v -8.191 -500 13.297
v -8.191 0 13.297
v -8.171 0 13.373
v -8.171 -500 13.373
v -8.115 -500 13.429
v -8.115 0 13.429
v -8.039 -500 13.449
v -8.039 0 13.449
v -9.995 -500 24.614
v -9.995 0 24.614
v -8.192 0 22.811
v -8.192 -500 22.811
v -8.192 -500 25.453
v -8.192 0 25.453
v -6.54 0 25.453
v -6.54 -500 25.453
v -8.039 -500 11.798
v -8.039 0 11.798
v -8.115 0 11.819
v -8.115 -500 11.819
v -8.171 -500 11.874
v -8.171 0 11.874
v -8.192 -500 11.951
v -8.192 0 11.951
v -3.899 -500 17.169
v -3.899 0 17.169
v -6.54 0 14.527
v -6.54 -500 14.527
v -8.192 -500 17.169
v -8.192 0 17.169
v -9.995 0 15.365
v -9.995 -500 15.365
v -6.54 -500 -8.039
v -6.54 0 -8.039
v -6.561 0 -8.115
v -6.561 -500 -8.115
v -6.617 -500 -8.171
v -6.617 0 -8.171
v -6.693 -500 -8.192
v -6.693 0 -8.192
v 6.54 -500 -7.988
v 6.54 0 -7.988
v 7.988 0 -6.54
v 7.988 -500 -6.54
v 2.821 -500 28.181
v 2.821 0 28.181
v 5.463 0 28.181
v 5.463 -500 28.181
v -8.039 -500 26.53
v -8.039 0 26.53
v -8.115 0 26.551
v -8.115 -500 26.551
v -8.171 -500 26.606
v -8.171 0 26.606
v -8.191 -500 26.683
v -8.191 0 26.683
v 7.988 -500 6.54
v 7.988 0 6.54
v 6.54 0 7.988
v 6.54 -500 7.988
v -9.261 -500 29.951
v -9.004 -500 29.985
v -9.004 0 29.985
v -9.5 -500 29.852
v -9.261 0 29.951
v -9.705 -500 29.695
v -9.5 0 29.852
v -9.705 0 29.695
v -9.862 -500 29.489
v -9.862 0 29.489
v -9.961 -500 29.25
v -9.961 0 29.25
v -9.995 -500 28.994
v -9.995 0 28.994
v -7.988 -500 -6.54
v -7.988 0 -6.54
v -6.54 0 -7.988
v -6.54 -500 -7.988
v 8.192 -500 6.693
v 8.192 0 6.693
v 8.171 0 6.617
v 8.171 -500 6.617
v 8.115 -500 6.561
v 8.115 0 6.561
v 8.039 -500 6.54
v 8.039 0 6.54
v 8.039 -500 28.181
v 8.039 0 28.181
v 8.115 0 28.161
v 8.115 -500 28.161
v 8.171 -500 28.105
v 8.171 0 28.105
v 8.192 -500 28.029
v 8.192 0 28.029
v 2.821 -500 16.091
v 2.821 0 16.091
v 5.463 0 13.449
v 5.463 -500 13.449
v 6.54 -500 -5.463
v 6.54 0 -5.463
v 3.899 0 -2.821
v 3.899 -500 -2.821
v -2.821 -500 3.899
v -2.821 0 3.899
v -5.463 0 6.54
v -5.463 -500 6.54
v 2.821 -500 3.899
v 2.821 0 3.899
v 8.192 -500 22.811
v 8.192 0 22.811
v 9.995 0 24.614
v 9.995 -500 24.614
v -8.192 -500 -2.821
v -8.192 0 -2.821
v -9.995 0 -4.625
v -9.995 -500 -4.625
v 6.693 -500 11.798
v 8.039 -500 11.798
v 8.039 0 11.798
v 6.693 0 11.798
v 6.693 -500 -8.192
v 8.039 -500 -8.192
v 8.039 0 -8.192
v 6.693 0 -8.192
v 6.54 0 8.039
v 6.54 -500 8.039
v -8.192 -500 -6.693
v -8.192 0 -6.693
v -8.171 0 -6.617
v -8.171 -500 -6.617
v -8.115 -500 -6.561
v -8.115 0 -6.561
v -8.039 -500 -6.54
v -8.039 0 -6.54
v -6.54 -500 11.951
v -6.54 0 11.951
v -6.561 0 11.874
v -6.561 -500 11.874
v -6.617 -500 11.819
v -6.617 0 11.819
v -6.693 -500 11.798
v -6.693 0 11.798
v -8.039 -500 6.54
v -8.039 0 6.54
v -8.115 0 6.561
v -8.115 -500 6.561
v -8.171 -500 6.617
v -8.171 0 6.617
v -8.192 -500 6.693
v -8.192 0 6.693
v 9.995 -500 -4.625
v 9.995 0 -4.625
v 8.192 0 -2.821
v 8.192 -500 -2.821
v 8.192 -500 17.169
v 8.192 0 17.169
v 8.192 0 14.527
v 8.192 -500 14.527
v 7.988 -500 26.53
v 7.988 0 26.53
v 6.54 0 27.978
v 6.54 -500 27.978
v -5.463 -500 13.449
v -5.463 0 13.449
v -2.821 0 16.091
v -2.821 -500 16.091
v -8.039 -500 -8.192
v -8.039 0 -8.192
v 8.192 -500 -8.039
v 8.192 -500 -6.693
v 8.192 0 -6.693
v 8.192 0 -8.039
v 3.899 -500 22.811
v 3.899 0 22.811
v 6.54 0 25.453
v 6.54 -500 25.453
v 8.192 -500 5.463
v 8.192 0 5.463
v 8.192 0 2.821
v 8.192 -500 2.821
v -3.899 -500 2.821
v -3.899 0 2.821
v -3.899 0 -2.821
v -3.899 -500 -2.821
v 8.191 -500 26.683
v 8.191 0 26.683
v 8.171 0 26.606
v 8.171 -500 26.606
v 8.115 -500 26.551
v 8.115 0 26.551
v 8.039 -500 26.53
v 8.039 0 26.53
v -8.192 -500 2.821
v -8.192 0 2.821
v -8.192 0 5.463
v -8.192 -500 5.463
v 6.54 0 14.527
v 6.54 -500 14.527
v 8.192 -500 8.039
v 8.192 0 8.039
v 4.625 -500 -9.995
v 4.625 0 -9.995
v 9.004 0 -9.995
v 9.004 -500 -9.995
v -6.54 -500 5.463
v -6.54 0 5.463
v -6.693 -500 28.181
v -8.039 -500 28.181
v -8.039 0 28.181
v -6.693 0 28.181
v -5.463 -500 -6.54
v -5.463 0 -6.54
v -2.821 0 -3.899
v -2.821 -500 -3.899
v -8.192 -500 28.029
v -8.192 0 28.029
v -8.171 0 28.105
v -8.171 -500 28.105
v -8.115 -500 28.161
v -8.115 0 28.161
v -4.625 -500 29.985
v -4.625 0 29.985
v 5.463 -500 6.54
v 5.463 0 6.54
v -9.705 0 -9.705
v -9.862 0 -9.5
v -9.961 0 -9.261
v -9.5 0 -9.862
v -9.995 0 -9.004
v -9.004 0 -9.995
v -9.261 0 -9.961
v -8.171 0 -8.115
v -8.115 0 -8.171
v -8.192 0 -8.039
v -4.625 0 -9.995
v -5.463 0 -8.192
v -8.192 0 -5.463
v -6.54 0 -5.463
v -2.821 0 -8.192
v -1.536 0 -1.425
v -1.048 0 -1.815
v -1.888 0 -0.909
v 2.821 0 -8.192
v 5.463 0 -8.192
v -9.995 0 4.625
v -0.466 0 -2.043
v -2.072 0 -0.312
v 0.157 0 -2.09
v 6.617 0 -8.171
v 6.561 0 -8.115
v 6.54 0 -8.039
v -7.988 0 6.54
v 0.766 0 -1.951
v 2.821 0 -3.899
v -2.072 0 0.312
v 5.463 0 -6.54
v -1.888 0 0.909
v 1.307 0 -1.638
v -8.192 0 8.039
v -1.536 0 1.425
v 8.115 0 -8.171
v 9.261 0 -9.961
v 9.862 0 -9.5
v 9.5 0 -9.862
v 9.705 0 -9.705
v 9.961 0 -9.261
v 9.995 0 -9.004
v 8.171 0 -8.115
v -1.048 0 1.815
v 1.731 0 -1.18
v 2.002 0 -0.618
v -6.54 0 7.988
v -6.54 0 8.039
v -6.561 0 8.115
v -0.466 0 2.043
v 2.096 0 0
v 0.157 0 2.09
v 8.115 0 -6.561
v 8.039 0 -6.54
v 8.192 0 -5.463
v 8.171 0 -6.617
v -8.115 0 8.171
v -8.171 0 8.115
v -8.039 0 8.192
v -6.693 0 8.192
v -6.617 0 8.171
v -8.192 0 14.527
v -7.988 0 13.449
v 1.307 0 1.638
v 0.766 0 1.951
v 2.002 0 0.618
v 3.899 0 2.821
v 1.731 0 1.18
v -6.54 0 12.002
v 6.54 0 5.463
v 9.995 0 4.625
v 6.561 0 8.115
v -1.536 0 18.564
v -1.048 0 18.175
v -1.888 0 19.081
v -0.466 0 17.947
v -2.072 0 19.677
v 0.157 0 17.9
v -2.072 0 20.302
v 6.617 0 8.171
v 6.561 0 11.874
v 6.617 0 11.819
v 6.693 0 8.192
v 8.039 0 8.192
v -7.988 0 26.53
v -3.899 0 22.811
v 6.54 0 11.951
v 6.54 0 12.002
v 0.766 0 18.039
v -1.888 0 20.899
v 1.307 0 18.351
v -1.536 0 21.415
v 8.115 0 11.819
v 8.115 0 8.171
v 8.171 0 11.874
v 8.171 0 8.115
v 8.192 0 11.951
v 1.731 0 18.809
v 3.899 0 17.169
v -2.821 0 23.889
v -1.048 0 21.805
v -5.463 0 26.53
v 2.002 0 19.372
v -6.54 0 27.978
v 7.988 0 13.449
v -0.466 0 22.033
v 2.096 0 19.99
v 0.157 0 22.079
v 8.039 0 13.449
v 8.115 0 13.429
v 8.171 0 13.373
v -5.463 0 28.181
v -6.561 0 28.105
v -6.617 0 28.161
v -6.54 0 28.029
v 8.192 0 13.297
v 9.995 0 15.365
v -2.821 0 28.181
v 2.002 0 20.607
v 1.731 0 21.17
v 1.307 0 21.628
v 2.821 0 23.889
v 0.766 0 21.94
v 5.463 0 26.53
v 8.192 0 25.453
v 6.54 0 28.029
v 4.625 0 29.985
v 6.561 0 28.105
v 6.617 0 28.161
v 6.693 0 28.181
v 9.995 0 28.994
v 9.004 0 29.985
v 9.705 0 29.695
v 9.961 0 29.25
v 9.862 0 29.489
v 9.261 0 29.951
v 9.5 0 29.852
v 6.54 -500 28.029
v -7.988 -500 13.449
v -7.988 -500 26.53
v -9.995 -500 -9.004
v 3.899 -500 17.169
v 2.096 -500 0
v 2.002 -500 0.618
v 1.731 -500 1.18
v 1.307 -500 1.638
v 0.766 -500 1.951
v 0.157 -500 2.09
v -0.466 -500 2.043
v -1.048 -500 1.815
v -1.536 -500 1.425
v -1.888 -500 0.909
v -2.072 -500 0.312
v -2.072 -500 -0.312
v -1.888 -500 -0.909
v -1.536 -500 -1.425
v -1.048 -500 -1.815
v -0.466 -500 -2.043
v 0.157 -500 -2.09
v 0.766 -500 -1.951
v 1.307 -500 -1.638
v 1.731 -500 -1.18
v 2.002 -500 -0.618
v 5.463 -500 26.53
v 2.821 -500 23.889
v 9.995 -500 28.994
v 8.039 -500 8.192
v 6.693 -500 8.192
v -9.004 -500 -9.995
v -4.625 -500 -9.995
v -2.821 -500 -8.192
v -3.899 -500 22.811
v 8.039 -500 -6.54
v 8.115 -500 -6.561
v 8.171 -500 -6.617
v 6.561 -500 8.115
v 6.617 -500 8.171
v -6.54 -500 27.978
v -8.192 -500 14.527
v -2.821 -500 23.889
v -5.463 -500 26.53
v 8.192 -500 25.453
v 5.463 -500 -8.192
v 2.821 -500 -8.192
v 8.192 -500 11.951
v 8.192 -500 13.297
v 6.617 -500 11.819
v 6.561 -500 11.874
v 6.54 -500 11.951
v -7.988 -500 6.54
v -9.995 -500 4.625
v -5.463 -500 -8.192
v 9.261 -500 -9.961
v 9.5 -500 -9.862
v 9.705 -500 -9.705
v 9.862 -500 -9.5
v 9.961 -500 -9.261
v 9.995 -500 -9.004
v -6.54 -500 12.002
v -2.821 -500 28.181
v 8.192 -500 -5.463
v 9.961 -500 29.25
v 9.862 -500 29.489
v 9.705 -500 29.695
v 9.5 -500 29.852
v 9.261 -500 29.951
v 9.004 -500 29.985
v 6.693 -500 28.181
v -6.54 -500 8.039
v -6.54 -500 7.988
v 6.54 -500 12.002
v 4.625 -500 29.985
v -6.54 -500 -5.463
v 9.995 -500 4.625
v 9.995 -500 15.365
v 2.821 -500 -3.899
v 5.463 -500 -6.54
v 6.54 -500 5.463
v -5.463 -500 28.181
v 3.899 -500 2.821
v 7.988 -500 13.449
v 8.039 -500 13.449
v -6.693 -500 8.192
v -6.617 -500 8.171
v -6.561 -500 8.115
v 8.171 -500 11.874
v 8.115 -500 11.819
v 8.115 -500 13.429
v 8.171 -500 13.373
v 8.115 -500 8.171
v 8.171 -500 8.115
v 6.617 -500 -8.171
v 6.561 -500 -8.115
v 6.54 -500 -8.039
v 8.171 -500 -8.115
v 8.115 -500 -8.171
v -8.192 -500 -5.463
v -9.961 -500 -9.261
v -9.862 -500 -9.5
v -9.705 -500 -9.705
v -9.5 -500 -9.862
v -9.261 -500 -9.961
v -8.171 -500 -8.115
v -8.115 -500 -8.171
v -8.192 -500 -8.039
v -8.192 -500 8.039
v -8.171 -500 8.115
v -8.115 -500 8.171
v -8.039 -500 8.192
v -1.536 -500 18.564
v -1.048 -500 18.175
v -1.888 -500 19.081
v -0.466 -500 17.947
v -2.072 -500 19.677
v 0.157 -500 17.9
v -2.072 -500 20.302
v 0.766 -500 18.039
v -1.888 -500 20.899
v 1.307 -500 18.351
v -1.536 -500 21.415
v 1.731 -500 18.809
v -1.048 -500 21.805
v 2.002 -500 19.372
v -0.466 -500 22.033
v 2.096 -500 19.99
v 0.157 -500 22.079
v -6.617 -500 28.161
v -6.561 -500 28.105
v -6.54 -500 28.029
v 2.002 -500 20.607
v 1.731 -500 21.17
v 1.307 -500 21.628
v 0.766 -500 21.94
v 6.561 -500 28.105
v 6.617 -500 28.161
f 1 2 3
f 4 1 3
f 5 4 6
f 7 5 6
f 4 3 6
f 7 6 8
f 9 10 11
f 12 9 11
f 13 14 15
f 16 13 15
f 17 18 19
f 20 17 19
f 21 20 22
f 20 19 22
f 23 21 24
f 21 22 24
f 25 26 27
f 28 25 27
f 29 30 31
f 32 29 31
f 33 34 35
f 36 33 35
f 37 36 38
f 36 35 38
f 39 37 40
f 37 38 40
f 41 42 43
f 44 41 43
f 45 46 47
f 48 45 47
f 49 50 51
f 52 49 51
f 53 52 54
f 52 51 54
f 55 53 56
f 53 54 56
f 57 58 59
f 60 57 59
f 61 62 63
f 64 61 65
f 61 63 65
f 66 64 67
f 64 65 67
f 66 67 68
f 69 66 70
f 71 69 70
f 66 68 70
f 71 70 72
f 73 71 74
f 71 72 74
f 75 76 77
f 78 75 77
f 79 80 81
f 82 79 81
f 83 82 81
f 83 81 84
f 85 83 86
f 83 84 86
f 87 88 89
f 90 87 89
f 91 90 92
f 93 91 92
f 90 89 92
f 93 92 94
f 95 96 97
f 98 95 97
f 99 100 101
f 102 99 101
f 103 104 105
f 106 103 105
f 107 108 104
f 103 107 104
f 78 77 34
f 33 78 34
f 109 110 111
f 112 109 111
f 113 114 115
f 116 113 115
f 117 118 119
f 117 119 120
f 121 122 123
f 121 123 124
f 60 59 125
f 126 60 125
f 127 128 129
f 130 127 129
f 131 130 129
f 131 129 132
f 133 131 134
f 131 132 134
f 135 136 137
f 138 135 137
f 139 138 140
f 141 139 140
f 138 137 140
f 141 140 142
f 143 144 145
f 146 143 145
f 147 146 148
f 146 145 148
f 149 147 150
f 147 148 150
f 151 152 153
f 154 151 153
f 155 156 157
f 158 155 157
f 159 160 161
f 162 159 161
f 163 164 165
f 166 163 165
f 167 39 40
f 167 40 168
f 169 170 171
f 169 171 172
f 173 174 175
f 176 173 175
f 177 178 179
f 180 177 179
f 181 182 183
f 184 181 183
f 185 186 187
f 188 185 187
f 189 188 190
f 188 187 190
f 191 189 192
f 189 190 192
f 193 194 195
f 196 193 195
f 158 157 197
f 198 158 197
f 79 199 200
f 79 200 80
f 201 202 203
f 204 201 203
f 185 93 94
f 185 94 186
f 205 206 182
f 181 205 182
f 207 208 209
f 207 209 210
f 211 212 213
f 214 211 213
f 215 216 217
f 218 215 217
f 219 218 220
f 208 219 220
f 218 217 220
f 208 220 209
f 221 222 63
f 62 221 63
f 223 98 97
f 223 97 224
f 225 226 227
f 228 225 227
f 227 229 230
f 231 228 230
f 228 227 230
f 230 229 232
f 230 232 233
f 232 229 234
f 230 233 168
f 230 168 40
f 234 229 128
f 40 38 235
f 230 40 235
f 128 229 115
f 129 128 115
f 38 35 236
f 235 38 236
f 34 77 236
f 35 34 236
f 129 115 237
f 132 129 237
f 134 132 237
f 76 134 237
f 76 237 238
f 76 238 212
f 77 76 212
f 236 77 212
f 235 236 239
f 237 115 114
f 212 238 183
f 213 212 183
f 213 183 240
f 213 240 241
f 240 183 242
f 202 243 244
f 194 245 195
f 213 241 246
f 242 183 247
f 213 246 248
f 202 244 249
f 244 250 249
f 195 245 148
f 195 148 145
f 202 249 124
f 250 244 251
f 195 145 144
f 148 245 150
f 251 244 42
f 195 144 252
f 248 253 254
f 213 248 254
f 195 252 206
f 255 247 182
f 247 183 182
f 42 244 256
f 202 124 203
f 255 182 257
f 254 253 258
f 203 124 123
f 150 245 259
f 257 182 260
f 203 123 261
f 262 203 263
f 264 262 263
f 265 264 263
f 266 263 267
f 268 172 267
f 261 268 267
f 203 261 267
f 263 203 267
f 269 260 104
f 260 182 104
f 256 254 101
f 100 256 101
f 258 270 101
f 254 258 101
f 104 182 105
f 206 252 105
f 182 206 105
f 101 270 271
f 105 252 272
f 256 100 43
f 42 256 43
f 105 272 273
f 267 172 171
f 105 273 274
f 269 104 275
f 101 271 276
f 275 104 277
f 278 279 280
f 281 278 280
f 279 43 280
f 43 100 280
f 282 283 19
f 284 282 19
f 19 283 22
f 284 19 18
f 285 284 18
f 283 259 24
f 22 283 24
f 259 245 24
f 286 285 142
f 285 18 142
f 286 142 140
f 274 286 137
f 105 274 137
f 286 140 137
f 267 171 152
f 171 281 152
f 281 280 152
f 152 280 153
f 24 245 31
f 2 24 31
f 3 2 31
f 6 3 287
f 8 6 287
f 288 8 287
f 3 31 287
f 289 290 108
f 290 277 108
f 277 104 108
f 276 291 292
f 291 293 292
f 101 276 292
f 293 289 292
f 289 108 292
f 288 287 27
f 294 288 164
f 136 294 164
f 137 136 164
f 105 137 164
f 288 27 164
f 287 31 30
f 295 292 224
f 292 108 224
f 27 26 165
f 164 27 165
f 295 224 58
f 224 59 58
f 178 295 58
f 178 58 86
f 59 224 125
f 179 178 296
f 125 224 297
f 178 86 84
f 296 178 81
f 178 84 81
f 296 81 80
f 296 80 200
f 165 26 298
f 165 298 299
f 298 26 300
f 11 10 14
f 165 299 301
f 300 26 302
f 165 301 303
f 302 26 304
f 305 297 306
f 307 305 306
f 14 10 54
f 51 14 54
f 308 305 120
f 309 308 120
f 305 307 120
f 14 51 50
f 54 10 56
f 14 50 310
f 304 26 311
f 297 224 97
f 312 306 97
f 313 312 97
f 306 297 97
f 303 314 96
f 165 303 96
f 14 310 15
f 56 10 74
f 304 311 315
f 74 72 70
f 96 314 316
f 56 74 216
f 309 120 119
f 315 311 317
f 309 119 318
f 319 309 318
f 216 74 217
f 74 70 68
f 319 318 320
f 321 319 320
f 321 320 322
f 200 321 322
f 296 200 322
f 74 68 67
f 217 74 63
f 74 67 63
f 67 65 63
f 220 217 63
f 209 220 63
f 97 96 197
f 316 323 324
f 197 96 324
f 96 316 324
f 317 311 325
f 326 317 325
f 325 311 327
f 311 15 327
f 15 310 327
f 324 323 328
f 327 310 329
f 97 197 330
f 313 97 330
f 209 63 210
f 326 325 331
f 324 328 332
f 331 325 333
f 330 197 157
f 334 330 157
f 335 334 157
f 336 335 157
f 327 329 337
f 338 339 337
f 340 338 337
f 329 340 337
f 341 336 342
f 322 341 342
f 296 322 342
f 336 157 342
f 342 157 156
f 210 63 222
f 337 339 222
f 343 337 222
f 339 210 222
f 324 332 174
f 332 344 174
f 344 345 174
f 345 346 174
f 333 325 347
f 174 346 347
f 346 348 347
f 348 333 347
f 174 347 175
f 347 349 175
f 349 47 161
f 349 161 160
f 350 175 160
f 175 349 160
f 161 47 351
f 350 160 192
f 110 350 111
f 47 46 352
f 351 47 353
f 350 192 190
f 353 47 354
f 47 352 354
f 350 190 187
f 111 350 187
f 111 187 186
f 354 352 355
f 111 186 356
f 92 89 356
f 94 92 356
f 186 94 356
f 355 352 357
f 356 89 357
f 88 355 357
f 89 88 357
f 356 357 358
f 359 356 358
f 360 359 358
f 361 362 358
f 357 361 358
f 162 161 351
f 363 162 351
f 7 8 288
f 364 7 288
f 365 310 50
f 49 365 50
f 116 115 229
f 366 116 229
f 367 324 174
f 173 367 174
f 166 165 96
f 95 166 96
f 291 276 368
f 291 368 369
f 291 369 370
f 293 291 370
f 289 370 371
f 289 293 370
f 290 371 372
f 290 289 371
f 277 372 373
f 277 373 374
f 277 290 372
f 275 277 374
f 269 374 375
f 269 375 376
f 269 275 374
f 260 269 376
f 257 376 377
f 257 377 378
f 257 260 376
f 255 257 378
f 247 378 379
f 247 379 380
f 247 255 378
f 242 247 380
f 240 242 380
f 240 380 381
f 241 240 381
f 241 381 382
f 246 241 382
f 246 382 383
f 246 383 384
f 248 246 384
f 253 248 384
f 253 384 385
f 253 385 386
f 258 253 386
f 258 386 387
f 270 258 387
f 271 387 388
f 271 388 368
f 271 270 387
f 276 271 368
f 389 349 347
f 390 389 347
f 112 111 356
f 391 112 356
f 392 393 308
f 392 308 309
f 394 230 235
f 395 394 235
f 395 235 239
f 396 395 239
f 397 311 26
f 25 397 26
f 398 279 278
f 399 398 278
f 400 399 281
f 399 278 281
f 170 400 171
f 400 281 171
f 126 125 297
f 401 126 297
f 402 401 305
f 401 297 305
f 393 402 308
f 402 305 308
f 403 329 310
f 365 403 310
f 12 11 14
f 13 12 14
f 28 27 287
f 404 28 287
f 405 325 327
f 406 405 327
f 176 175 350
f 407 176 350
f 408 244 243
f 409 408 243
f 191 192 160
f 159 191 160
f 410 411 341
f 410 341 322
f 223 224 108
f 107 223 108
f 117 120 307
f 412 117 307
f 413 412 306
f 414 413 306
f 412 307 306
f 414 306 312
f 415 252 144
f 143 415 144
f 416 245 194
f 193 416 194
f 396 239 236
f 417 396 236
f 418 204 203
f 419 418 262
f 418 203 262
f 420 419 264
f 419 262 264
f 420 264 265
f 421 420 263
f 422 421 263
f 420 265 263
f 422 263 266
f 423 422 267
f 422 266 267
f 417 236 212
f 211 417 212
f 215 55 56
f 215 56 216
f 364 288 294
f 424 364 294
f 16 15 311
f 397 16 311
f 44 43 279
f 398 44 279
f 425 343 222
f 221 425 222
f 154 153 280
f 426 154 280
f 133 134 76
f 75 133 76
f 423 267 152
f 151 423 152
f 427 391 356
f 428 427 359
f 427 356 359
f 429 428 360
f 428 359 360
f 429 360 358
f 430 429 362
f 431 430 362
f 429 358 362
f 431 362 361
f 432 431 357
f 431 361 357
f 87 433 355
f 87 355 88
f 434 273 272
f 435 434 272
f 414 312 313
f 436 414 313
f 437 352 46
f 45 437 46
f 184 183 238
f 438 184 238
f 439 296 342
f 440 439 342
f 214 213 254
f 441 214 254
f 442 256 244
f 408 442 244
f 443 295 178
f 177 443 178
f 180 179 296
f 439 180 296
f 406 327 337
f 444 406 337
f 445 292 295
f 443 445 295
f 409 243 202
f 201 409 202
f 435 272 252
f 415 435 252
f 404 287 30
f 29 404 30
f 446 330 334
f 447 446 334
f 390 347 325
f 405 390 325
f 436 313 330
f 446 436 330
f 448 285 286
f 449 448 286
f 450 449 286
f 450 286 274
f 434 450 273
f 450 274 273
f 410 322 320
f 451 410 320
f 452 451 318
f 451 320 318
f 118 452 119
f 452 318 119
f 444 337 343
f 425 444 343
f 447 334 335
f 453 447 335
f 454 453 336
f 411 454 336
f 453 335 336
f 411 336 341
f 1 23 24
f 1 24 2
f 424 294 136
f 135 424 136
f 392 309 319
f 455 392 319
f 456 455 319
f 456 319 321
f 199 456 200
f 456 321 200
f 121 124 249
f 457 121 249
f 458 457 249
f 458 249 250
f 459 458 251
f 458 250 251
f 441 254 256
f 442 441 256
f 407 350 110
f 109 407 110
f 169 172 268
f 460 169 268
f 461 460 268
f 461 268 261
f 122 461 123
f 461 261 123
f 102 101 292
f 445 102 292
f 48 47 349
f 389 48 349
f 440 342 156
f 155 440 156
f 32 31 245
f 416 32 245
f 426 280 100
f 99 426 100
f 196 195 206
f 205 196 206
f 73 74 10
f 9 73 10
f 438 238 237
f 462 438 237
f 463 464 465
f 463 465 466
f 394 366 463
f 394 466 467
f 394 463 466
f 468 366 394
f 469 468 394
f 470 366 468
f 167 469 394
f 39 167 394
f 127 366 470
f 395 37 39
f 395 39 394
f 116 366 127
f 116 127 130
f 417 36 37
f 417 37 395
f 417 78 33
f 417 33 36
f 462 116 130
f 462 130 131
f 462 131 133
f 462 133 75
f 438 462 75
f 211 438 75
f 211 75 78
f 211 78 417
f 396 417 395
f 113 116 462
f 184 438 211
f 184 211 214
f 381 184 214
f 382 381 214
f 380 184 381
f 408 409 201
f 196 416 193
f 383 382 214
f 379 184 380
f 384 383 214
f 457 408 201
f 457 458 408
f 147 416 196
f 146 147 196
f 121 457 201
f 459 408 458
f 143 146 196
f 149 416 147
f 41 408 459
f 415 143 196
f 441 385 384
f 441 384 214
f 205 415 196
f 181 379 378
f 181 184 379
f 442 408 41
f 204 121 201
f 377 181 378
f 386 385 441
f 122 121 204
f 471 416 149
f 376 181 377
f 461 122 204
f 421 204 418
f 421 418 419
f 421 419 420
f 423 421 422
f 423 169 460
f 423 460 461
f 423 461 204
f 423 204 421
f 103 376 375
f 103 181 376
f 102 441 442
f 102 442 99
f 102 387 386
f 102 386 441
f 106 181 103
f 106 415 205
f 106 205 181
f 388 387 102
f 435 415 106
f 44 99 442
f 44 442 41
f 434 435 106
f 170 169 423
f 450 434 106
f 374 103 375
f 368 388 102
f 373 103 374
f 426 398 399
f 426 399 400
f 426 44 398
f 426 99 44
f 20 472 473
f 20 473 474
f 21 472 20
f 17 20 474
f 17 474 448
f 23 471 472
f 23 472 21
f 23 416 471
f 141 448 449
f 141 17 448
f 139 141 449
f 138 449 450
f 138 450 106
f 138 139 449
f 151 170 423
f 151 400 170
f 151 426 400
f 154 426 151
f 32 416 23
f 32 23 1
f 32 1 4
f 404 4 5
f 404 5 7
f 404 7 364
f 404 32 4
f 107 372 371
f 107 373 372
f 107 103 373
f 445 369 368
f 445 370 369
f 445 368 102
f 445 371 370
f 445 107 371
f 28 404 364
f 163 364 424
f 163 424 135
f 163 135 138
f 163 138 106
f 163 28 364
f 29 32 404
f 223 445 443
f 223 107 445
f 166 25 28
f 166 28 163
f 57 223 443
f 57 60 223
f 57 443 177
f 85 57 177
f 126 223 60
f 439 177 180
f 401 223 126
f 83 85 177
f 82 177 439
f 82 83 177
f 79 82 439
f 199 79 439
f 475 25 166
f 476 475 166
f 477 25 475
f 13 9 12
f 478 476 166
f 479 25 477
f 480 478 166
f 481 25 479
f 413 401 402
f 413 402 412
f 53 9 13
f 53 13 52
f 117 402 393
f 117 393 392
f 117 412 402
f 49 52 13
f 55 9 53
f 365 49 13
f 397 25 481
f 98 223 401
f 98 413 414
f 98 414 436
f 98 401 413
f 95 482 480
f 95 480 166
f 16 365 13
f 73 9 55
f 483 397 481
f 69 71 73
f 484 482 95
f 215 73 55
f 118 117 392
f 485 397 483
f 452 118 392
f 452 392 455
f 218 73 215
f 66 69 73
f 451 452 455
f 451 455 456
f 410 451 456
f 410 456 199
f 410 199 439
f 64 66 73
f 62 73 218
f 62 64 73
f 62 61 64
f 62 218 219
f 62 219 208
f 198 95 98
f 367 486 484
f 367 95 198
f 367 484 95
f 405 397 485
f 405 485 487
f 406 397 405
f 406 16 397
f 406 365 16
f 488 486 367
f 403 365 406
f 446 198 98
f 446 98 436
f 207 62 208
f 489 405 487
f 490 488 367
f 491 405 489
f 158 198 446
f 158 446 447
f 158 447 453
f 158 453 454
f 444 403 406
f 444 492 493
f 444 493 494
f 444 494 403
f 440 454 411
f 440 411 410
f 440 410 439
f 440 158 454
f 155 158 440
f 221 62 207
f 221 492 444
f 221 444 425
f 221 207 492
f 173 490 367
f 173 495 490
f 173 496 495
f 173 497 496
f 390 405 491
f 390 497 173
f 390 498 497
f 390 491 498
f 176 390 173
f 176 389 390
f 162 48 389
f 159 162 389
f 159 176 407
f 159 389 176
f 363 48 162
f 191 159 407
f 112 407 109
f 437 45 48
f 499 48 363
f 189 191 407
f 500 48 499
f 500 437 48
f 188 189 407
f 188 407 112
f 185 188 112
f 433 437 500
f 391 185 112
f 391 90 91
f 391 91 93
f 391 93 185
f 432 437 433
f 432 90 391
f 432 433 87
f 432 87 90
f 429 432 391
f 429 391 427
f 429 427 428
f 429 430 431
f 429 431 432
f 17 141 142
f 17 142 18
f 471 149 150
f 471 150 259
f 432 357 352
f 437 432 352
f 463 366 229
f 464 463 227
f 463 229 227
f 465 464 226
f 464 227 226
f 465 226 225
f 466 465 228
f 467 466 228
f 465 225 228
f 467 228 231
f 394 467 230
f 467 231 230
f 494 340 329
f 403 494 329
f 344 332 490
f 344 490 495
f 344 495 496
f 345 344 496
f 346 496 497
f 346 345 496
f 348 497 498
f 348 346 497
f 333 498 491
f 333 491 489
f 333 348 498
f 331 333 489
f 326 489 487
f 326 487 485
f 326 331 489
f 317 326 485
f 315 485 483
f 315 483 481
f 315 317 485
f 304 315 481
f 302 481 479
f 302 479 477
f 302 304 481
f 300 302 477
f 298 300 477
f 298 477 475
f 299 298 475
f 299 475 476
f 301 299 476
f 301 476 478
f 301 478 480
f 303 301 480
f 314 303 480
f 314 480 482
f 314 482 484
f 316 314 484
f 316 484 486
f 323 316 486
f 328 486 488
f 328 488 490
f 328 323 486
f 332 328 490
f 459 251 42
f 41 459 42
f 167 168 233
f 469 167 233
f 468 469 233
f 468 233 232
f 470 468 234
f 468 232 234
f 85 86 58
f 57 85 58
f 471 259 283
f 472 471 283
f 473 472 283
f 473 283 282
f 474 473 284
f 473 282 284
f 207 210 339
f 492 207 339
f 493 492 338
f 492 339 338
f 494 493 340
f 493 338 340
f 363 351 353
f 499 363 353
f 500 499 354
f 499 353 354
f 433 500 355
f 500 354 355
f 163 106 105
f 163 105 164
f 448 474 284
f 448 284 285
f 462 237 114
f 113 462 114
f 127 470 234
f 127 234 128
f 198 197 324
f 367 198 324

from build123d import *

# Parameters (mm, degrees)
F0_R     = 2.0955
F2_DEPTH = 500


with BuildPart() as f2:
    # F0 (on Front) → F2 (new body)
    with BuildSketch(Plane.XZ):
        with BuildLine():
            ThreePointArc((-9.9949, -9.0043), (-9.7047599774, -9.7047599774), (-9.0043, -9.9949))
            Line((-9.0043, -9.9949), (-4.6246692655, -9.9949))
            Line((-4.6246692655, -9.9949), (-2.8212692655, -8.1915))
            Line((-2.8212692655, -8.1915), (-5.4628692655, -8.1915))
            Line((-5.4628692655, -8.1915), (-5.4628692655, -6.5405))
            Line((-5.4628692655, -6.5405), (-2.8212692655, -3.8989))
            Line((-2.8212692655, -3.8989), (2.8212692655, -3.8989))
            Line((2.8212692655, -3.8989), (5.4628692655, -6.5405))
            Line((5.4628692655, -6.5405), (5.4628692655, -8.1915))
            Line((5.4628692655, -8.1915), (2.8212692655, -8.1915))
            Line((2.8212692655, -8.1915), (4.6246692655, -9.9949))
            Line((4.6246692655, -9.9949), (9.0043, -9.9949))
            ThreePointArc((9.0043, -9.9949), (9.7047599774, -9.7047599774), (9.9949, -9.0043))
            Line((9.9949, -9.0043), (9.9949, -4.6246692655))
            Line((9.9949, -4.6246692655), (8.1915, -2.8212692655))
            Line((8.1915, -2.8212692655), (8.1915, -5.4628692655))
            Line((8.1915, -5.4628692655), (6.5405, -5.4628692655))
            Line((6.5405, -5.4628692655), (3.8989, -2.8212692655))
            Line((3.8989, -2.8212692655), (3.8989, 2.8212692655))
            Line((3.8989, 2.8212692655), (6.5405, 5.4628692655))
            Line((6.5405, 5.4628692655), (8.1915, 5.4628692655))
            Line((8.1915, 5.4628692655), (8.1915, 2.8212692655))
            Line((8.1915, 2.8212692655), (9.9949, 4.6246692655))
            Line((9.9949, 4.6246692655), (9.9949, 9.0043))
            Line((9.9949, 9.0043), (9.9949, 10.9855))
            Line((9.9949, 10.9855), (9.9949, 15.3651307345))
            Line((9.9949, 15.3651307345), (8.1915, 17.1685307345))
            Line((8.1915, 17.1685307345), (8.1915, 14.5269307345))
            Line((8.1915, 14.5269307345), (6.5405, 14.5269307345))
            Line((6.5405, 14.5269307345), (3.8989, 17.1685307345))
            Line((3.8989, 17.1685307345), (3.8989, 22.8110692655))
            Line((3.8989, 22.8110692655), (6.5405, 25.4526692655))
            Line((6.5405, 25.4526692655), (8.1915, 25.4526692655))
            Line((8.1915, 25.4526692655), (8.1915, 22.8110692655))
            Line((8.1915, 22.8110692655), (9.9949, 24.6144692655))
            Line((9.9949, 24.6144692655), (9.9949, 28.9941))
            ThreePointArc((9.9949, 28.9941), (9.7047599774, 29.6945599774), (9.0043, 29.9847))
            Line((9.0043, 29.9847), (4.6246692655, 29.9847))
            Line((4.6246692655, 29.9847), (2.8212692655, 28.1813))
            Line((2.8212692655, 28.1813), (5.4628692655, 28.1813))
            Line((5.4628692655, 28.1813), (5.4628692655, 26.5303))
            Line((5.4628692655, 26.5303), (2.8212692655, 23.8887))
            Line((2.8212692655, 23.8887), (-2.8212692655, 23.8887))
            Line((-2.8212692655, 23.8887), (-5.4628692655, 26.5303))
            Line((-5.4628692655, 26.5303), (-5.4628692655, 28.1813))
            Line((-5.4628692655, 28.1813), (-2.8212692655, 28.1813))
            Line((-2.8212692655, 28.1813), (-4.6246692655, 29.9847))
            Line((-4.6246692655, 29.9847), (-9.0043, 29.9847))
            ThreePointArc((-9.0043, 29.9847), (-9.7047599774, 29.6945599774), (-9.9949, 28.9941))
            Line((-9.9949, 28.9941), (-9.9949, 24.6144692655))
            Line((-9.9949, 24.6144692655), (-8.1915, 22.8110692655))
            Line((-8.1915, 22.8110692655), (-8.1915, 25.4526692655))
            Line((-8.1915, 25.4526692655), (-6.5405, 25.4526692655))
            Line((-6.5405, 25.4526692655), (-3.8989, 22.8110692655))
            Line((-3.8989, 22.8110692655), (-3.8989, 17.1685307345))
            Line((-3.8989, 17.1685307345), (-6.5405, 14.5269307345))
            Line((-6.5405, 14.5269307345), (-8.1915, 14.5269307345))
            Line((-8.1915, 14.5269307345), (-8.1915, 17.1685307345))
            Line((-8.1915, 17.1685307345), (-9.9949, 15.3651307345))
            Line((-9.9949, 15.3651307345), (-9.9949, 10.9855))
            Line((-9.9949, 10.9855), (-9.9949, 9.0043))
            Line((-9.9949, 9.0043), (-9.9949, 4.6246692655))
            Line((-9.9949, 4.6246692655), (-8.1915, 2.8212692655))
            Line((-8.1915, 2.8212692655), (-8.1915, 5.4628692655))
            Line((-8.1915, 5.4628692655), (-6.5405, 5.4628692655))
            Line((-6.5405, 5.4628692655), (-3.8989, 2.8212692655))
            Line((-3.8989, 2.8212692655), (-3.8989, -2.8212692655))
            Line((-3.8989, -2.8212692655), (-6.5405, -5.4628692655))
            Line((-6.5405, -5.4628692655), (-8.1915, -5.4628692655))
            Line((-8.1915, -5.4628692655), (-8.1915, -2.8212692655))
            Line((-8.1915, -2.8212692655), (-9.9949, -4.6246692655))
            Line((-9.9949, -4.6246692655), (-9.9949, -9.0043))
        make_face()
        with BuildLine():
            ThreePointArc((-8.0391, -8.1915), (-8.1468630735, -8.1468630735), (-8.1915, -8.0391))
            Line((-8.1915, -8.0391), (-8.1915, -6.6929))
            ThreePointArc((-8.1915, -6.6929), (-8.1468630735, -6.5851369265), (-8.0391, -6.5405))
            Line((-8.0391, -6.5405), (-7.9883, -6.5405))
            Line((-7.9883, -6.5405), (-6.5405, -7.9883))
            Line((-6.5405, -7.9883), (-6.5405, -8.0391))
            ThreePointArc((-6.5405, -8.0391), (-6.5851369265, -8.1468630735), (-6.6929, -8.1915))
            Line((-6.6929, -8.1915), (-8.0391, -8.1915))
        make_face(mode=Mode.SUBTRACT)
        with BuildLine():
            Line((-7.9883, 6.5405), (-8.0391, 6.5405))
            ThreePointArc((-8.0391, 6.5405), (-8.1468630735, 6.5851369265), (-8.1915, 6.6929))
            Line((-8.1915, 6.6929), (-8.1915, 8.0391))
            ThreePointArc((-8.1915, 8.0391), (-8.1468630735, 8.1468630735), (-8.0391, 8.1915))
            Line((-8.0391, 8.1915), (-6.6929, 8.1915))
            ThreePointArc((-6.6929, 8.1915), (-6.5851369265, 8.1468630735), (-6.5405, 8.0391))
            Line((-6.5405, 8.0391), (-6.5405, 7.9883))
            Line((-6.5405, 7.9883), (-7.9883, 6.5405))
        make_face(mode=Mode.SUBTRACT)
        with BuildLine():
            Line((8.1915, -6.6929), (8.1915, -8.0391))
            ThreePointArc((8.1915, -8.0391), (8.1468630735, -8.1468630735), (8.0391, -8.1915))
            Line((8.0391, -8.1915), (6.6929, -8.1915))
            ThreePointArc((6.6929, -8.1915), (6.5851369265, -8.1468630735), (6.5405, -8.0391))
            Line((6.5405, -8.0391), (6.5405, -7.9883))
            Line((6.5405, -7.9883), (7.9883, -6.5405))
            Line((7.9883, -6.5405), (8.0391, -6.5405))
            ThreePointArc((8.0391, -6.5405), (8.1468630735, -6.5851369265), (8.1915, -6.6929))
        make_face(mode=Mode.SUBTRACT)
        Circle(F0_R, mode=Mode.SUBTRACT)
        with BuildLine():
            ThreePointArc((8.1915, 6.6929), (8.1468630735, 6.5851369265), (8.0391, 6.5405))
            Line((8.0391, 6.5405), (7.9883, 6.5405))
            Line((7.9883, 6.5405), (6.5405, 7.9883))
            Line((6.5405, 7.9883), (6.5405, 8.0391))
            ThreePointArc((6.5405, 8.0391), (6.5851369265, 8.1468630735), (6.6929, 8.1915))
            Line((6.6929, 8.1915), (8.0391, 8.1915))
            ThreePointArc((8.0391, 8.1915), (8.1468630735, 8.1468630735), (8.1915, 8.0391))
            Line((8.1915, 8.0391), (8.1915, 6.6929))
        make_face(mode=Mode.SUBTRACT)
        with BuildLine():
            ThreePointArc((-8.1915, 13.2969), (-8.1468630735, 13.4046630735), (-8.0391, 13.4493))
            Line((-8.0391, 13.4493), (-7.9883, 13.4493))
            Line((-7.9883, 13.4493), (-6.5405, 12.0015))
            Line((-6.5405, 12.0015), (-6.5405, 11.9507))
            ThreePointArc((-6.5405, 11.9507), (-6.5851369265, 11.8429369265), (-6.6929, 11.7983))
            Line((-6.6929, 11.7983), (-8.0391, 11.7983))
            ThreePointArc((-8.0391, 11.7983), (-8.1468630735, 11.8429369265), (-8.1915, 11.9507))
            Line((-8.1915, 11.9507), (-8.1915, 13.2969))
        make_face(mode=Mode.SUBTRACT)
        with BuildLine():
            ThreePointArc((-6.6929, 28.1813), (-6.5851369265, 28.1366630735), (-6.5405, 28.0289))
            Line((-6.5405, 28.0289), (-6.5405, 27.9781))
            Line((-6.5405, 27.9781), (-7.9883, 26.5303))
            Line((-7.9883, 26.5303), (-8.0391, 26.5303))
            ThreePointArc((-8.0391, 26.5303), (-8.1468630735, 26.5749369265), (-8.1915, 26.6827))
            Line((-8.1915, 26.6827), (-8.1915, 28.0289))
            ThreePointArc((-8.1915, 28.0289), (-8.1468630735, 28.1366630735), (-8.0391, 28.1813))
            Line((-8.0391, 28.1813), (-6.6929, 28.1813))
        make_face(mode=Mode.SUBTRACT)
        Polygon((5.4628692655, 6.5405), (2.8212692655, 3.8989), (-2.8212692655, 3.8989), (-5.4628692655, 6.5405), (-5.4628692655, 13.4493), (-2.8212692655, 16.0909), (2.8212692655, 16.0909), (5.4628692655, 13.4493), align=None, mode=Mode.SUBTRACT)
        with Locations((0, 19.9898)):
            Circle(F0_R, mode=Mode.SUBTRACT)
        with BuildLine():
            Line((8.0391, 11.7983), (6.6929, 11.7983))
            ThreePointArc((6.6929, 11.7983), (6.5851369265, 11.8429369265), (6.5405, 11.9507))
            Line((6.5405, 11.9507), (6.5405, 12.0015))
            Line((6.5405, 12.0015), (7.9883, 13.4493))
            Line((7.9883, 13.4493), (8.0391, 13.4493))
            ThreePointArc((8.0391, 13.4493), (8.1468630735, 13.4046630735), (8.1915, 13.2969))
            Line((8.1915, 13.2969), (8.1915, 11.9507))
            ThreePointArc((8.1915, 11.9507), (8.1468630735, 11.8429369265), (8.0391, 11.7983))
        make_face(mode=Mode.SUBTRACT)
        with BuildLine():
            ThreePointArc((6.5405, 28.0289), (6.5851369265, 28.1366630735), (6.6929, 28.1813))
            Line((6.6929, 28.1813), (8.0391, 28.1813))
            ThreePointArc((8.0391, 28.1813), (8.1468630735, 28.1366630735), (8.1915, 28.0289))
            Line((8.1915, 28.0289), (8.1915, 26.6827))
            ThreePointArc((8.1915, 26.6827), (8.1468630735, 26.5749369265), (8.0391, 26.5303))
            Line((8.0391, 26.5303), (7.9883, 26.5303))
            Line((7.9883, 26.5303), (6.5405, 27.9781))
            Line((6.5405, 27.9781), (6.5405, 28.0289))
        make_face(mode=Mode.SUBTRACT)
    extrude(amount=F2_DEPTH)


solid = f2.part
